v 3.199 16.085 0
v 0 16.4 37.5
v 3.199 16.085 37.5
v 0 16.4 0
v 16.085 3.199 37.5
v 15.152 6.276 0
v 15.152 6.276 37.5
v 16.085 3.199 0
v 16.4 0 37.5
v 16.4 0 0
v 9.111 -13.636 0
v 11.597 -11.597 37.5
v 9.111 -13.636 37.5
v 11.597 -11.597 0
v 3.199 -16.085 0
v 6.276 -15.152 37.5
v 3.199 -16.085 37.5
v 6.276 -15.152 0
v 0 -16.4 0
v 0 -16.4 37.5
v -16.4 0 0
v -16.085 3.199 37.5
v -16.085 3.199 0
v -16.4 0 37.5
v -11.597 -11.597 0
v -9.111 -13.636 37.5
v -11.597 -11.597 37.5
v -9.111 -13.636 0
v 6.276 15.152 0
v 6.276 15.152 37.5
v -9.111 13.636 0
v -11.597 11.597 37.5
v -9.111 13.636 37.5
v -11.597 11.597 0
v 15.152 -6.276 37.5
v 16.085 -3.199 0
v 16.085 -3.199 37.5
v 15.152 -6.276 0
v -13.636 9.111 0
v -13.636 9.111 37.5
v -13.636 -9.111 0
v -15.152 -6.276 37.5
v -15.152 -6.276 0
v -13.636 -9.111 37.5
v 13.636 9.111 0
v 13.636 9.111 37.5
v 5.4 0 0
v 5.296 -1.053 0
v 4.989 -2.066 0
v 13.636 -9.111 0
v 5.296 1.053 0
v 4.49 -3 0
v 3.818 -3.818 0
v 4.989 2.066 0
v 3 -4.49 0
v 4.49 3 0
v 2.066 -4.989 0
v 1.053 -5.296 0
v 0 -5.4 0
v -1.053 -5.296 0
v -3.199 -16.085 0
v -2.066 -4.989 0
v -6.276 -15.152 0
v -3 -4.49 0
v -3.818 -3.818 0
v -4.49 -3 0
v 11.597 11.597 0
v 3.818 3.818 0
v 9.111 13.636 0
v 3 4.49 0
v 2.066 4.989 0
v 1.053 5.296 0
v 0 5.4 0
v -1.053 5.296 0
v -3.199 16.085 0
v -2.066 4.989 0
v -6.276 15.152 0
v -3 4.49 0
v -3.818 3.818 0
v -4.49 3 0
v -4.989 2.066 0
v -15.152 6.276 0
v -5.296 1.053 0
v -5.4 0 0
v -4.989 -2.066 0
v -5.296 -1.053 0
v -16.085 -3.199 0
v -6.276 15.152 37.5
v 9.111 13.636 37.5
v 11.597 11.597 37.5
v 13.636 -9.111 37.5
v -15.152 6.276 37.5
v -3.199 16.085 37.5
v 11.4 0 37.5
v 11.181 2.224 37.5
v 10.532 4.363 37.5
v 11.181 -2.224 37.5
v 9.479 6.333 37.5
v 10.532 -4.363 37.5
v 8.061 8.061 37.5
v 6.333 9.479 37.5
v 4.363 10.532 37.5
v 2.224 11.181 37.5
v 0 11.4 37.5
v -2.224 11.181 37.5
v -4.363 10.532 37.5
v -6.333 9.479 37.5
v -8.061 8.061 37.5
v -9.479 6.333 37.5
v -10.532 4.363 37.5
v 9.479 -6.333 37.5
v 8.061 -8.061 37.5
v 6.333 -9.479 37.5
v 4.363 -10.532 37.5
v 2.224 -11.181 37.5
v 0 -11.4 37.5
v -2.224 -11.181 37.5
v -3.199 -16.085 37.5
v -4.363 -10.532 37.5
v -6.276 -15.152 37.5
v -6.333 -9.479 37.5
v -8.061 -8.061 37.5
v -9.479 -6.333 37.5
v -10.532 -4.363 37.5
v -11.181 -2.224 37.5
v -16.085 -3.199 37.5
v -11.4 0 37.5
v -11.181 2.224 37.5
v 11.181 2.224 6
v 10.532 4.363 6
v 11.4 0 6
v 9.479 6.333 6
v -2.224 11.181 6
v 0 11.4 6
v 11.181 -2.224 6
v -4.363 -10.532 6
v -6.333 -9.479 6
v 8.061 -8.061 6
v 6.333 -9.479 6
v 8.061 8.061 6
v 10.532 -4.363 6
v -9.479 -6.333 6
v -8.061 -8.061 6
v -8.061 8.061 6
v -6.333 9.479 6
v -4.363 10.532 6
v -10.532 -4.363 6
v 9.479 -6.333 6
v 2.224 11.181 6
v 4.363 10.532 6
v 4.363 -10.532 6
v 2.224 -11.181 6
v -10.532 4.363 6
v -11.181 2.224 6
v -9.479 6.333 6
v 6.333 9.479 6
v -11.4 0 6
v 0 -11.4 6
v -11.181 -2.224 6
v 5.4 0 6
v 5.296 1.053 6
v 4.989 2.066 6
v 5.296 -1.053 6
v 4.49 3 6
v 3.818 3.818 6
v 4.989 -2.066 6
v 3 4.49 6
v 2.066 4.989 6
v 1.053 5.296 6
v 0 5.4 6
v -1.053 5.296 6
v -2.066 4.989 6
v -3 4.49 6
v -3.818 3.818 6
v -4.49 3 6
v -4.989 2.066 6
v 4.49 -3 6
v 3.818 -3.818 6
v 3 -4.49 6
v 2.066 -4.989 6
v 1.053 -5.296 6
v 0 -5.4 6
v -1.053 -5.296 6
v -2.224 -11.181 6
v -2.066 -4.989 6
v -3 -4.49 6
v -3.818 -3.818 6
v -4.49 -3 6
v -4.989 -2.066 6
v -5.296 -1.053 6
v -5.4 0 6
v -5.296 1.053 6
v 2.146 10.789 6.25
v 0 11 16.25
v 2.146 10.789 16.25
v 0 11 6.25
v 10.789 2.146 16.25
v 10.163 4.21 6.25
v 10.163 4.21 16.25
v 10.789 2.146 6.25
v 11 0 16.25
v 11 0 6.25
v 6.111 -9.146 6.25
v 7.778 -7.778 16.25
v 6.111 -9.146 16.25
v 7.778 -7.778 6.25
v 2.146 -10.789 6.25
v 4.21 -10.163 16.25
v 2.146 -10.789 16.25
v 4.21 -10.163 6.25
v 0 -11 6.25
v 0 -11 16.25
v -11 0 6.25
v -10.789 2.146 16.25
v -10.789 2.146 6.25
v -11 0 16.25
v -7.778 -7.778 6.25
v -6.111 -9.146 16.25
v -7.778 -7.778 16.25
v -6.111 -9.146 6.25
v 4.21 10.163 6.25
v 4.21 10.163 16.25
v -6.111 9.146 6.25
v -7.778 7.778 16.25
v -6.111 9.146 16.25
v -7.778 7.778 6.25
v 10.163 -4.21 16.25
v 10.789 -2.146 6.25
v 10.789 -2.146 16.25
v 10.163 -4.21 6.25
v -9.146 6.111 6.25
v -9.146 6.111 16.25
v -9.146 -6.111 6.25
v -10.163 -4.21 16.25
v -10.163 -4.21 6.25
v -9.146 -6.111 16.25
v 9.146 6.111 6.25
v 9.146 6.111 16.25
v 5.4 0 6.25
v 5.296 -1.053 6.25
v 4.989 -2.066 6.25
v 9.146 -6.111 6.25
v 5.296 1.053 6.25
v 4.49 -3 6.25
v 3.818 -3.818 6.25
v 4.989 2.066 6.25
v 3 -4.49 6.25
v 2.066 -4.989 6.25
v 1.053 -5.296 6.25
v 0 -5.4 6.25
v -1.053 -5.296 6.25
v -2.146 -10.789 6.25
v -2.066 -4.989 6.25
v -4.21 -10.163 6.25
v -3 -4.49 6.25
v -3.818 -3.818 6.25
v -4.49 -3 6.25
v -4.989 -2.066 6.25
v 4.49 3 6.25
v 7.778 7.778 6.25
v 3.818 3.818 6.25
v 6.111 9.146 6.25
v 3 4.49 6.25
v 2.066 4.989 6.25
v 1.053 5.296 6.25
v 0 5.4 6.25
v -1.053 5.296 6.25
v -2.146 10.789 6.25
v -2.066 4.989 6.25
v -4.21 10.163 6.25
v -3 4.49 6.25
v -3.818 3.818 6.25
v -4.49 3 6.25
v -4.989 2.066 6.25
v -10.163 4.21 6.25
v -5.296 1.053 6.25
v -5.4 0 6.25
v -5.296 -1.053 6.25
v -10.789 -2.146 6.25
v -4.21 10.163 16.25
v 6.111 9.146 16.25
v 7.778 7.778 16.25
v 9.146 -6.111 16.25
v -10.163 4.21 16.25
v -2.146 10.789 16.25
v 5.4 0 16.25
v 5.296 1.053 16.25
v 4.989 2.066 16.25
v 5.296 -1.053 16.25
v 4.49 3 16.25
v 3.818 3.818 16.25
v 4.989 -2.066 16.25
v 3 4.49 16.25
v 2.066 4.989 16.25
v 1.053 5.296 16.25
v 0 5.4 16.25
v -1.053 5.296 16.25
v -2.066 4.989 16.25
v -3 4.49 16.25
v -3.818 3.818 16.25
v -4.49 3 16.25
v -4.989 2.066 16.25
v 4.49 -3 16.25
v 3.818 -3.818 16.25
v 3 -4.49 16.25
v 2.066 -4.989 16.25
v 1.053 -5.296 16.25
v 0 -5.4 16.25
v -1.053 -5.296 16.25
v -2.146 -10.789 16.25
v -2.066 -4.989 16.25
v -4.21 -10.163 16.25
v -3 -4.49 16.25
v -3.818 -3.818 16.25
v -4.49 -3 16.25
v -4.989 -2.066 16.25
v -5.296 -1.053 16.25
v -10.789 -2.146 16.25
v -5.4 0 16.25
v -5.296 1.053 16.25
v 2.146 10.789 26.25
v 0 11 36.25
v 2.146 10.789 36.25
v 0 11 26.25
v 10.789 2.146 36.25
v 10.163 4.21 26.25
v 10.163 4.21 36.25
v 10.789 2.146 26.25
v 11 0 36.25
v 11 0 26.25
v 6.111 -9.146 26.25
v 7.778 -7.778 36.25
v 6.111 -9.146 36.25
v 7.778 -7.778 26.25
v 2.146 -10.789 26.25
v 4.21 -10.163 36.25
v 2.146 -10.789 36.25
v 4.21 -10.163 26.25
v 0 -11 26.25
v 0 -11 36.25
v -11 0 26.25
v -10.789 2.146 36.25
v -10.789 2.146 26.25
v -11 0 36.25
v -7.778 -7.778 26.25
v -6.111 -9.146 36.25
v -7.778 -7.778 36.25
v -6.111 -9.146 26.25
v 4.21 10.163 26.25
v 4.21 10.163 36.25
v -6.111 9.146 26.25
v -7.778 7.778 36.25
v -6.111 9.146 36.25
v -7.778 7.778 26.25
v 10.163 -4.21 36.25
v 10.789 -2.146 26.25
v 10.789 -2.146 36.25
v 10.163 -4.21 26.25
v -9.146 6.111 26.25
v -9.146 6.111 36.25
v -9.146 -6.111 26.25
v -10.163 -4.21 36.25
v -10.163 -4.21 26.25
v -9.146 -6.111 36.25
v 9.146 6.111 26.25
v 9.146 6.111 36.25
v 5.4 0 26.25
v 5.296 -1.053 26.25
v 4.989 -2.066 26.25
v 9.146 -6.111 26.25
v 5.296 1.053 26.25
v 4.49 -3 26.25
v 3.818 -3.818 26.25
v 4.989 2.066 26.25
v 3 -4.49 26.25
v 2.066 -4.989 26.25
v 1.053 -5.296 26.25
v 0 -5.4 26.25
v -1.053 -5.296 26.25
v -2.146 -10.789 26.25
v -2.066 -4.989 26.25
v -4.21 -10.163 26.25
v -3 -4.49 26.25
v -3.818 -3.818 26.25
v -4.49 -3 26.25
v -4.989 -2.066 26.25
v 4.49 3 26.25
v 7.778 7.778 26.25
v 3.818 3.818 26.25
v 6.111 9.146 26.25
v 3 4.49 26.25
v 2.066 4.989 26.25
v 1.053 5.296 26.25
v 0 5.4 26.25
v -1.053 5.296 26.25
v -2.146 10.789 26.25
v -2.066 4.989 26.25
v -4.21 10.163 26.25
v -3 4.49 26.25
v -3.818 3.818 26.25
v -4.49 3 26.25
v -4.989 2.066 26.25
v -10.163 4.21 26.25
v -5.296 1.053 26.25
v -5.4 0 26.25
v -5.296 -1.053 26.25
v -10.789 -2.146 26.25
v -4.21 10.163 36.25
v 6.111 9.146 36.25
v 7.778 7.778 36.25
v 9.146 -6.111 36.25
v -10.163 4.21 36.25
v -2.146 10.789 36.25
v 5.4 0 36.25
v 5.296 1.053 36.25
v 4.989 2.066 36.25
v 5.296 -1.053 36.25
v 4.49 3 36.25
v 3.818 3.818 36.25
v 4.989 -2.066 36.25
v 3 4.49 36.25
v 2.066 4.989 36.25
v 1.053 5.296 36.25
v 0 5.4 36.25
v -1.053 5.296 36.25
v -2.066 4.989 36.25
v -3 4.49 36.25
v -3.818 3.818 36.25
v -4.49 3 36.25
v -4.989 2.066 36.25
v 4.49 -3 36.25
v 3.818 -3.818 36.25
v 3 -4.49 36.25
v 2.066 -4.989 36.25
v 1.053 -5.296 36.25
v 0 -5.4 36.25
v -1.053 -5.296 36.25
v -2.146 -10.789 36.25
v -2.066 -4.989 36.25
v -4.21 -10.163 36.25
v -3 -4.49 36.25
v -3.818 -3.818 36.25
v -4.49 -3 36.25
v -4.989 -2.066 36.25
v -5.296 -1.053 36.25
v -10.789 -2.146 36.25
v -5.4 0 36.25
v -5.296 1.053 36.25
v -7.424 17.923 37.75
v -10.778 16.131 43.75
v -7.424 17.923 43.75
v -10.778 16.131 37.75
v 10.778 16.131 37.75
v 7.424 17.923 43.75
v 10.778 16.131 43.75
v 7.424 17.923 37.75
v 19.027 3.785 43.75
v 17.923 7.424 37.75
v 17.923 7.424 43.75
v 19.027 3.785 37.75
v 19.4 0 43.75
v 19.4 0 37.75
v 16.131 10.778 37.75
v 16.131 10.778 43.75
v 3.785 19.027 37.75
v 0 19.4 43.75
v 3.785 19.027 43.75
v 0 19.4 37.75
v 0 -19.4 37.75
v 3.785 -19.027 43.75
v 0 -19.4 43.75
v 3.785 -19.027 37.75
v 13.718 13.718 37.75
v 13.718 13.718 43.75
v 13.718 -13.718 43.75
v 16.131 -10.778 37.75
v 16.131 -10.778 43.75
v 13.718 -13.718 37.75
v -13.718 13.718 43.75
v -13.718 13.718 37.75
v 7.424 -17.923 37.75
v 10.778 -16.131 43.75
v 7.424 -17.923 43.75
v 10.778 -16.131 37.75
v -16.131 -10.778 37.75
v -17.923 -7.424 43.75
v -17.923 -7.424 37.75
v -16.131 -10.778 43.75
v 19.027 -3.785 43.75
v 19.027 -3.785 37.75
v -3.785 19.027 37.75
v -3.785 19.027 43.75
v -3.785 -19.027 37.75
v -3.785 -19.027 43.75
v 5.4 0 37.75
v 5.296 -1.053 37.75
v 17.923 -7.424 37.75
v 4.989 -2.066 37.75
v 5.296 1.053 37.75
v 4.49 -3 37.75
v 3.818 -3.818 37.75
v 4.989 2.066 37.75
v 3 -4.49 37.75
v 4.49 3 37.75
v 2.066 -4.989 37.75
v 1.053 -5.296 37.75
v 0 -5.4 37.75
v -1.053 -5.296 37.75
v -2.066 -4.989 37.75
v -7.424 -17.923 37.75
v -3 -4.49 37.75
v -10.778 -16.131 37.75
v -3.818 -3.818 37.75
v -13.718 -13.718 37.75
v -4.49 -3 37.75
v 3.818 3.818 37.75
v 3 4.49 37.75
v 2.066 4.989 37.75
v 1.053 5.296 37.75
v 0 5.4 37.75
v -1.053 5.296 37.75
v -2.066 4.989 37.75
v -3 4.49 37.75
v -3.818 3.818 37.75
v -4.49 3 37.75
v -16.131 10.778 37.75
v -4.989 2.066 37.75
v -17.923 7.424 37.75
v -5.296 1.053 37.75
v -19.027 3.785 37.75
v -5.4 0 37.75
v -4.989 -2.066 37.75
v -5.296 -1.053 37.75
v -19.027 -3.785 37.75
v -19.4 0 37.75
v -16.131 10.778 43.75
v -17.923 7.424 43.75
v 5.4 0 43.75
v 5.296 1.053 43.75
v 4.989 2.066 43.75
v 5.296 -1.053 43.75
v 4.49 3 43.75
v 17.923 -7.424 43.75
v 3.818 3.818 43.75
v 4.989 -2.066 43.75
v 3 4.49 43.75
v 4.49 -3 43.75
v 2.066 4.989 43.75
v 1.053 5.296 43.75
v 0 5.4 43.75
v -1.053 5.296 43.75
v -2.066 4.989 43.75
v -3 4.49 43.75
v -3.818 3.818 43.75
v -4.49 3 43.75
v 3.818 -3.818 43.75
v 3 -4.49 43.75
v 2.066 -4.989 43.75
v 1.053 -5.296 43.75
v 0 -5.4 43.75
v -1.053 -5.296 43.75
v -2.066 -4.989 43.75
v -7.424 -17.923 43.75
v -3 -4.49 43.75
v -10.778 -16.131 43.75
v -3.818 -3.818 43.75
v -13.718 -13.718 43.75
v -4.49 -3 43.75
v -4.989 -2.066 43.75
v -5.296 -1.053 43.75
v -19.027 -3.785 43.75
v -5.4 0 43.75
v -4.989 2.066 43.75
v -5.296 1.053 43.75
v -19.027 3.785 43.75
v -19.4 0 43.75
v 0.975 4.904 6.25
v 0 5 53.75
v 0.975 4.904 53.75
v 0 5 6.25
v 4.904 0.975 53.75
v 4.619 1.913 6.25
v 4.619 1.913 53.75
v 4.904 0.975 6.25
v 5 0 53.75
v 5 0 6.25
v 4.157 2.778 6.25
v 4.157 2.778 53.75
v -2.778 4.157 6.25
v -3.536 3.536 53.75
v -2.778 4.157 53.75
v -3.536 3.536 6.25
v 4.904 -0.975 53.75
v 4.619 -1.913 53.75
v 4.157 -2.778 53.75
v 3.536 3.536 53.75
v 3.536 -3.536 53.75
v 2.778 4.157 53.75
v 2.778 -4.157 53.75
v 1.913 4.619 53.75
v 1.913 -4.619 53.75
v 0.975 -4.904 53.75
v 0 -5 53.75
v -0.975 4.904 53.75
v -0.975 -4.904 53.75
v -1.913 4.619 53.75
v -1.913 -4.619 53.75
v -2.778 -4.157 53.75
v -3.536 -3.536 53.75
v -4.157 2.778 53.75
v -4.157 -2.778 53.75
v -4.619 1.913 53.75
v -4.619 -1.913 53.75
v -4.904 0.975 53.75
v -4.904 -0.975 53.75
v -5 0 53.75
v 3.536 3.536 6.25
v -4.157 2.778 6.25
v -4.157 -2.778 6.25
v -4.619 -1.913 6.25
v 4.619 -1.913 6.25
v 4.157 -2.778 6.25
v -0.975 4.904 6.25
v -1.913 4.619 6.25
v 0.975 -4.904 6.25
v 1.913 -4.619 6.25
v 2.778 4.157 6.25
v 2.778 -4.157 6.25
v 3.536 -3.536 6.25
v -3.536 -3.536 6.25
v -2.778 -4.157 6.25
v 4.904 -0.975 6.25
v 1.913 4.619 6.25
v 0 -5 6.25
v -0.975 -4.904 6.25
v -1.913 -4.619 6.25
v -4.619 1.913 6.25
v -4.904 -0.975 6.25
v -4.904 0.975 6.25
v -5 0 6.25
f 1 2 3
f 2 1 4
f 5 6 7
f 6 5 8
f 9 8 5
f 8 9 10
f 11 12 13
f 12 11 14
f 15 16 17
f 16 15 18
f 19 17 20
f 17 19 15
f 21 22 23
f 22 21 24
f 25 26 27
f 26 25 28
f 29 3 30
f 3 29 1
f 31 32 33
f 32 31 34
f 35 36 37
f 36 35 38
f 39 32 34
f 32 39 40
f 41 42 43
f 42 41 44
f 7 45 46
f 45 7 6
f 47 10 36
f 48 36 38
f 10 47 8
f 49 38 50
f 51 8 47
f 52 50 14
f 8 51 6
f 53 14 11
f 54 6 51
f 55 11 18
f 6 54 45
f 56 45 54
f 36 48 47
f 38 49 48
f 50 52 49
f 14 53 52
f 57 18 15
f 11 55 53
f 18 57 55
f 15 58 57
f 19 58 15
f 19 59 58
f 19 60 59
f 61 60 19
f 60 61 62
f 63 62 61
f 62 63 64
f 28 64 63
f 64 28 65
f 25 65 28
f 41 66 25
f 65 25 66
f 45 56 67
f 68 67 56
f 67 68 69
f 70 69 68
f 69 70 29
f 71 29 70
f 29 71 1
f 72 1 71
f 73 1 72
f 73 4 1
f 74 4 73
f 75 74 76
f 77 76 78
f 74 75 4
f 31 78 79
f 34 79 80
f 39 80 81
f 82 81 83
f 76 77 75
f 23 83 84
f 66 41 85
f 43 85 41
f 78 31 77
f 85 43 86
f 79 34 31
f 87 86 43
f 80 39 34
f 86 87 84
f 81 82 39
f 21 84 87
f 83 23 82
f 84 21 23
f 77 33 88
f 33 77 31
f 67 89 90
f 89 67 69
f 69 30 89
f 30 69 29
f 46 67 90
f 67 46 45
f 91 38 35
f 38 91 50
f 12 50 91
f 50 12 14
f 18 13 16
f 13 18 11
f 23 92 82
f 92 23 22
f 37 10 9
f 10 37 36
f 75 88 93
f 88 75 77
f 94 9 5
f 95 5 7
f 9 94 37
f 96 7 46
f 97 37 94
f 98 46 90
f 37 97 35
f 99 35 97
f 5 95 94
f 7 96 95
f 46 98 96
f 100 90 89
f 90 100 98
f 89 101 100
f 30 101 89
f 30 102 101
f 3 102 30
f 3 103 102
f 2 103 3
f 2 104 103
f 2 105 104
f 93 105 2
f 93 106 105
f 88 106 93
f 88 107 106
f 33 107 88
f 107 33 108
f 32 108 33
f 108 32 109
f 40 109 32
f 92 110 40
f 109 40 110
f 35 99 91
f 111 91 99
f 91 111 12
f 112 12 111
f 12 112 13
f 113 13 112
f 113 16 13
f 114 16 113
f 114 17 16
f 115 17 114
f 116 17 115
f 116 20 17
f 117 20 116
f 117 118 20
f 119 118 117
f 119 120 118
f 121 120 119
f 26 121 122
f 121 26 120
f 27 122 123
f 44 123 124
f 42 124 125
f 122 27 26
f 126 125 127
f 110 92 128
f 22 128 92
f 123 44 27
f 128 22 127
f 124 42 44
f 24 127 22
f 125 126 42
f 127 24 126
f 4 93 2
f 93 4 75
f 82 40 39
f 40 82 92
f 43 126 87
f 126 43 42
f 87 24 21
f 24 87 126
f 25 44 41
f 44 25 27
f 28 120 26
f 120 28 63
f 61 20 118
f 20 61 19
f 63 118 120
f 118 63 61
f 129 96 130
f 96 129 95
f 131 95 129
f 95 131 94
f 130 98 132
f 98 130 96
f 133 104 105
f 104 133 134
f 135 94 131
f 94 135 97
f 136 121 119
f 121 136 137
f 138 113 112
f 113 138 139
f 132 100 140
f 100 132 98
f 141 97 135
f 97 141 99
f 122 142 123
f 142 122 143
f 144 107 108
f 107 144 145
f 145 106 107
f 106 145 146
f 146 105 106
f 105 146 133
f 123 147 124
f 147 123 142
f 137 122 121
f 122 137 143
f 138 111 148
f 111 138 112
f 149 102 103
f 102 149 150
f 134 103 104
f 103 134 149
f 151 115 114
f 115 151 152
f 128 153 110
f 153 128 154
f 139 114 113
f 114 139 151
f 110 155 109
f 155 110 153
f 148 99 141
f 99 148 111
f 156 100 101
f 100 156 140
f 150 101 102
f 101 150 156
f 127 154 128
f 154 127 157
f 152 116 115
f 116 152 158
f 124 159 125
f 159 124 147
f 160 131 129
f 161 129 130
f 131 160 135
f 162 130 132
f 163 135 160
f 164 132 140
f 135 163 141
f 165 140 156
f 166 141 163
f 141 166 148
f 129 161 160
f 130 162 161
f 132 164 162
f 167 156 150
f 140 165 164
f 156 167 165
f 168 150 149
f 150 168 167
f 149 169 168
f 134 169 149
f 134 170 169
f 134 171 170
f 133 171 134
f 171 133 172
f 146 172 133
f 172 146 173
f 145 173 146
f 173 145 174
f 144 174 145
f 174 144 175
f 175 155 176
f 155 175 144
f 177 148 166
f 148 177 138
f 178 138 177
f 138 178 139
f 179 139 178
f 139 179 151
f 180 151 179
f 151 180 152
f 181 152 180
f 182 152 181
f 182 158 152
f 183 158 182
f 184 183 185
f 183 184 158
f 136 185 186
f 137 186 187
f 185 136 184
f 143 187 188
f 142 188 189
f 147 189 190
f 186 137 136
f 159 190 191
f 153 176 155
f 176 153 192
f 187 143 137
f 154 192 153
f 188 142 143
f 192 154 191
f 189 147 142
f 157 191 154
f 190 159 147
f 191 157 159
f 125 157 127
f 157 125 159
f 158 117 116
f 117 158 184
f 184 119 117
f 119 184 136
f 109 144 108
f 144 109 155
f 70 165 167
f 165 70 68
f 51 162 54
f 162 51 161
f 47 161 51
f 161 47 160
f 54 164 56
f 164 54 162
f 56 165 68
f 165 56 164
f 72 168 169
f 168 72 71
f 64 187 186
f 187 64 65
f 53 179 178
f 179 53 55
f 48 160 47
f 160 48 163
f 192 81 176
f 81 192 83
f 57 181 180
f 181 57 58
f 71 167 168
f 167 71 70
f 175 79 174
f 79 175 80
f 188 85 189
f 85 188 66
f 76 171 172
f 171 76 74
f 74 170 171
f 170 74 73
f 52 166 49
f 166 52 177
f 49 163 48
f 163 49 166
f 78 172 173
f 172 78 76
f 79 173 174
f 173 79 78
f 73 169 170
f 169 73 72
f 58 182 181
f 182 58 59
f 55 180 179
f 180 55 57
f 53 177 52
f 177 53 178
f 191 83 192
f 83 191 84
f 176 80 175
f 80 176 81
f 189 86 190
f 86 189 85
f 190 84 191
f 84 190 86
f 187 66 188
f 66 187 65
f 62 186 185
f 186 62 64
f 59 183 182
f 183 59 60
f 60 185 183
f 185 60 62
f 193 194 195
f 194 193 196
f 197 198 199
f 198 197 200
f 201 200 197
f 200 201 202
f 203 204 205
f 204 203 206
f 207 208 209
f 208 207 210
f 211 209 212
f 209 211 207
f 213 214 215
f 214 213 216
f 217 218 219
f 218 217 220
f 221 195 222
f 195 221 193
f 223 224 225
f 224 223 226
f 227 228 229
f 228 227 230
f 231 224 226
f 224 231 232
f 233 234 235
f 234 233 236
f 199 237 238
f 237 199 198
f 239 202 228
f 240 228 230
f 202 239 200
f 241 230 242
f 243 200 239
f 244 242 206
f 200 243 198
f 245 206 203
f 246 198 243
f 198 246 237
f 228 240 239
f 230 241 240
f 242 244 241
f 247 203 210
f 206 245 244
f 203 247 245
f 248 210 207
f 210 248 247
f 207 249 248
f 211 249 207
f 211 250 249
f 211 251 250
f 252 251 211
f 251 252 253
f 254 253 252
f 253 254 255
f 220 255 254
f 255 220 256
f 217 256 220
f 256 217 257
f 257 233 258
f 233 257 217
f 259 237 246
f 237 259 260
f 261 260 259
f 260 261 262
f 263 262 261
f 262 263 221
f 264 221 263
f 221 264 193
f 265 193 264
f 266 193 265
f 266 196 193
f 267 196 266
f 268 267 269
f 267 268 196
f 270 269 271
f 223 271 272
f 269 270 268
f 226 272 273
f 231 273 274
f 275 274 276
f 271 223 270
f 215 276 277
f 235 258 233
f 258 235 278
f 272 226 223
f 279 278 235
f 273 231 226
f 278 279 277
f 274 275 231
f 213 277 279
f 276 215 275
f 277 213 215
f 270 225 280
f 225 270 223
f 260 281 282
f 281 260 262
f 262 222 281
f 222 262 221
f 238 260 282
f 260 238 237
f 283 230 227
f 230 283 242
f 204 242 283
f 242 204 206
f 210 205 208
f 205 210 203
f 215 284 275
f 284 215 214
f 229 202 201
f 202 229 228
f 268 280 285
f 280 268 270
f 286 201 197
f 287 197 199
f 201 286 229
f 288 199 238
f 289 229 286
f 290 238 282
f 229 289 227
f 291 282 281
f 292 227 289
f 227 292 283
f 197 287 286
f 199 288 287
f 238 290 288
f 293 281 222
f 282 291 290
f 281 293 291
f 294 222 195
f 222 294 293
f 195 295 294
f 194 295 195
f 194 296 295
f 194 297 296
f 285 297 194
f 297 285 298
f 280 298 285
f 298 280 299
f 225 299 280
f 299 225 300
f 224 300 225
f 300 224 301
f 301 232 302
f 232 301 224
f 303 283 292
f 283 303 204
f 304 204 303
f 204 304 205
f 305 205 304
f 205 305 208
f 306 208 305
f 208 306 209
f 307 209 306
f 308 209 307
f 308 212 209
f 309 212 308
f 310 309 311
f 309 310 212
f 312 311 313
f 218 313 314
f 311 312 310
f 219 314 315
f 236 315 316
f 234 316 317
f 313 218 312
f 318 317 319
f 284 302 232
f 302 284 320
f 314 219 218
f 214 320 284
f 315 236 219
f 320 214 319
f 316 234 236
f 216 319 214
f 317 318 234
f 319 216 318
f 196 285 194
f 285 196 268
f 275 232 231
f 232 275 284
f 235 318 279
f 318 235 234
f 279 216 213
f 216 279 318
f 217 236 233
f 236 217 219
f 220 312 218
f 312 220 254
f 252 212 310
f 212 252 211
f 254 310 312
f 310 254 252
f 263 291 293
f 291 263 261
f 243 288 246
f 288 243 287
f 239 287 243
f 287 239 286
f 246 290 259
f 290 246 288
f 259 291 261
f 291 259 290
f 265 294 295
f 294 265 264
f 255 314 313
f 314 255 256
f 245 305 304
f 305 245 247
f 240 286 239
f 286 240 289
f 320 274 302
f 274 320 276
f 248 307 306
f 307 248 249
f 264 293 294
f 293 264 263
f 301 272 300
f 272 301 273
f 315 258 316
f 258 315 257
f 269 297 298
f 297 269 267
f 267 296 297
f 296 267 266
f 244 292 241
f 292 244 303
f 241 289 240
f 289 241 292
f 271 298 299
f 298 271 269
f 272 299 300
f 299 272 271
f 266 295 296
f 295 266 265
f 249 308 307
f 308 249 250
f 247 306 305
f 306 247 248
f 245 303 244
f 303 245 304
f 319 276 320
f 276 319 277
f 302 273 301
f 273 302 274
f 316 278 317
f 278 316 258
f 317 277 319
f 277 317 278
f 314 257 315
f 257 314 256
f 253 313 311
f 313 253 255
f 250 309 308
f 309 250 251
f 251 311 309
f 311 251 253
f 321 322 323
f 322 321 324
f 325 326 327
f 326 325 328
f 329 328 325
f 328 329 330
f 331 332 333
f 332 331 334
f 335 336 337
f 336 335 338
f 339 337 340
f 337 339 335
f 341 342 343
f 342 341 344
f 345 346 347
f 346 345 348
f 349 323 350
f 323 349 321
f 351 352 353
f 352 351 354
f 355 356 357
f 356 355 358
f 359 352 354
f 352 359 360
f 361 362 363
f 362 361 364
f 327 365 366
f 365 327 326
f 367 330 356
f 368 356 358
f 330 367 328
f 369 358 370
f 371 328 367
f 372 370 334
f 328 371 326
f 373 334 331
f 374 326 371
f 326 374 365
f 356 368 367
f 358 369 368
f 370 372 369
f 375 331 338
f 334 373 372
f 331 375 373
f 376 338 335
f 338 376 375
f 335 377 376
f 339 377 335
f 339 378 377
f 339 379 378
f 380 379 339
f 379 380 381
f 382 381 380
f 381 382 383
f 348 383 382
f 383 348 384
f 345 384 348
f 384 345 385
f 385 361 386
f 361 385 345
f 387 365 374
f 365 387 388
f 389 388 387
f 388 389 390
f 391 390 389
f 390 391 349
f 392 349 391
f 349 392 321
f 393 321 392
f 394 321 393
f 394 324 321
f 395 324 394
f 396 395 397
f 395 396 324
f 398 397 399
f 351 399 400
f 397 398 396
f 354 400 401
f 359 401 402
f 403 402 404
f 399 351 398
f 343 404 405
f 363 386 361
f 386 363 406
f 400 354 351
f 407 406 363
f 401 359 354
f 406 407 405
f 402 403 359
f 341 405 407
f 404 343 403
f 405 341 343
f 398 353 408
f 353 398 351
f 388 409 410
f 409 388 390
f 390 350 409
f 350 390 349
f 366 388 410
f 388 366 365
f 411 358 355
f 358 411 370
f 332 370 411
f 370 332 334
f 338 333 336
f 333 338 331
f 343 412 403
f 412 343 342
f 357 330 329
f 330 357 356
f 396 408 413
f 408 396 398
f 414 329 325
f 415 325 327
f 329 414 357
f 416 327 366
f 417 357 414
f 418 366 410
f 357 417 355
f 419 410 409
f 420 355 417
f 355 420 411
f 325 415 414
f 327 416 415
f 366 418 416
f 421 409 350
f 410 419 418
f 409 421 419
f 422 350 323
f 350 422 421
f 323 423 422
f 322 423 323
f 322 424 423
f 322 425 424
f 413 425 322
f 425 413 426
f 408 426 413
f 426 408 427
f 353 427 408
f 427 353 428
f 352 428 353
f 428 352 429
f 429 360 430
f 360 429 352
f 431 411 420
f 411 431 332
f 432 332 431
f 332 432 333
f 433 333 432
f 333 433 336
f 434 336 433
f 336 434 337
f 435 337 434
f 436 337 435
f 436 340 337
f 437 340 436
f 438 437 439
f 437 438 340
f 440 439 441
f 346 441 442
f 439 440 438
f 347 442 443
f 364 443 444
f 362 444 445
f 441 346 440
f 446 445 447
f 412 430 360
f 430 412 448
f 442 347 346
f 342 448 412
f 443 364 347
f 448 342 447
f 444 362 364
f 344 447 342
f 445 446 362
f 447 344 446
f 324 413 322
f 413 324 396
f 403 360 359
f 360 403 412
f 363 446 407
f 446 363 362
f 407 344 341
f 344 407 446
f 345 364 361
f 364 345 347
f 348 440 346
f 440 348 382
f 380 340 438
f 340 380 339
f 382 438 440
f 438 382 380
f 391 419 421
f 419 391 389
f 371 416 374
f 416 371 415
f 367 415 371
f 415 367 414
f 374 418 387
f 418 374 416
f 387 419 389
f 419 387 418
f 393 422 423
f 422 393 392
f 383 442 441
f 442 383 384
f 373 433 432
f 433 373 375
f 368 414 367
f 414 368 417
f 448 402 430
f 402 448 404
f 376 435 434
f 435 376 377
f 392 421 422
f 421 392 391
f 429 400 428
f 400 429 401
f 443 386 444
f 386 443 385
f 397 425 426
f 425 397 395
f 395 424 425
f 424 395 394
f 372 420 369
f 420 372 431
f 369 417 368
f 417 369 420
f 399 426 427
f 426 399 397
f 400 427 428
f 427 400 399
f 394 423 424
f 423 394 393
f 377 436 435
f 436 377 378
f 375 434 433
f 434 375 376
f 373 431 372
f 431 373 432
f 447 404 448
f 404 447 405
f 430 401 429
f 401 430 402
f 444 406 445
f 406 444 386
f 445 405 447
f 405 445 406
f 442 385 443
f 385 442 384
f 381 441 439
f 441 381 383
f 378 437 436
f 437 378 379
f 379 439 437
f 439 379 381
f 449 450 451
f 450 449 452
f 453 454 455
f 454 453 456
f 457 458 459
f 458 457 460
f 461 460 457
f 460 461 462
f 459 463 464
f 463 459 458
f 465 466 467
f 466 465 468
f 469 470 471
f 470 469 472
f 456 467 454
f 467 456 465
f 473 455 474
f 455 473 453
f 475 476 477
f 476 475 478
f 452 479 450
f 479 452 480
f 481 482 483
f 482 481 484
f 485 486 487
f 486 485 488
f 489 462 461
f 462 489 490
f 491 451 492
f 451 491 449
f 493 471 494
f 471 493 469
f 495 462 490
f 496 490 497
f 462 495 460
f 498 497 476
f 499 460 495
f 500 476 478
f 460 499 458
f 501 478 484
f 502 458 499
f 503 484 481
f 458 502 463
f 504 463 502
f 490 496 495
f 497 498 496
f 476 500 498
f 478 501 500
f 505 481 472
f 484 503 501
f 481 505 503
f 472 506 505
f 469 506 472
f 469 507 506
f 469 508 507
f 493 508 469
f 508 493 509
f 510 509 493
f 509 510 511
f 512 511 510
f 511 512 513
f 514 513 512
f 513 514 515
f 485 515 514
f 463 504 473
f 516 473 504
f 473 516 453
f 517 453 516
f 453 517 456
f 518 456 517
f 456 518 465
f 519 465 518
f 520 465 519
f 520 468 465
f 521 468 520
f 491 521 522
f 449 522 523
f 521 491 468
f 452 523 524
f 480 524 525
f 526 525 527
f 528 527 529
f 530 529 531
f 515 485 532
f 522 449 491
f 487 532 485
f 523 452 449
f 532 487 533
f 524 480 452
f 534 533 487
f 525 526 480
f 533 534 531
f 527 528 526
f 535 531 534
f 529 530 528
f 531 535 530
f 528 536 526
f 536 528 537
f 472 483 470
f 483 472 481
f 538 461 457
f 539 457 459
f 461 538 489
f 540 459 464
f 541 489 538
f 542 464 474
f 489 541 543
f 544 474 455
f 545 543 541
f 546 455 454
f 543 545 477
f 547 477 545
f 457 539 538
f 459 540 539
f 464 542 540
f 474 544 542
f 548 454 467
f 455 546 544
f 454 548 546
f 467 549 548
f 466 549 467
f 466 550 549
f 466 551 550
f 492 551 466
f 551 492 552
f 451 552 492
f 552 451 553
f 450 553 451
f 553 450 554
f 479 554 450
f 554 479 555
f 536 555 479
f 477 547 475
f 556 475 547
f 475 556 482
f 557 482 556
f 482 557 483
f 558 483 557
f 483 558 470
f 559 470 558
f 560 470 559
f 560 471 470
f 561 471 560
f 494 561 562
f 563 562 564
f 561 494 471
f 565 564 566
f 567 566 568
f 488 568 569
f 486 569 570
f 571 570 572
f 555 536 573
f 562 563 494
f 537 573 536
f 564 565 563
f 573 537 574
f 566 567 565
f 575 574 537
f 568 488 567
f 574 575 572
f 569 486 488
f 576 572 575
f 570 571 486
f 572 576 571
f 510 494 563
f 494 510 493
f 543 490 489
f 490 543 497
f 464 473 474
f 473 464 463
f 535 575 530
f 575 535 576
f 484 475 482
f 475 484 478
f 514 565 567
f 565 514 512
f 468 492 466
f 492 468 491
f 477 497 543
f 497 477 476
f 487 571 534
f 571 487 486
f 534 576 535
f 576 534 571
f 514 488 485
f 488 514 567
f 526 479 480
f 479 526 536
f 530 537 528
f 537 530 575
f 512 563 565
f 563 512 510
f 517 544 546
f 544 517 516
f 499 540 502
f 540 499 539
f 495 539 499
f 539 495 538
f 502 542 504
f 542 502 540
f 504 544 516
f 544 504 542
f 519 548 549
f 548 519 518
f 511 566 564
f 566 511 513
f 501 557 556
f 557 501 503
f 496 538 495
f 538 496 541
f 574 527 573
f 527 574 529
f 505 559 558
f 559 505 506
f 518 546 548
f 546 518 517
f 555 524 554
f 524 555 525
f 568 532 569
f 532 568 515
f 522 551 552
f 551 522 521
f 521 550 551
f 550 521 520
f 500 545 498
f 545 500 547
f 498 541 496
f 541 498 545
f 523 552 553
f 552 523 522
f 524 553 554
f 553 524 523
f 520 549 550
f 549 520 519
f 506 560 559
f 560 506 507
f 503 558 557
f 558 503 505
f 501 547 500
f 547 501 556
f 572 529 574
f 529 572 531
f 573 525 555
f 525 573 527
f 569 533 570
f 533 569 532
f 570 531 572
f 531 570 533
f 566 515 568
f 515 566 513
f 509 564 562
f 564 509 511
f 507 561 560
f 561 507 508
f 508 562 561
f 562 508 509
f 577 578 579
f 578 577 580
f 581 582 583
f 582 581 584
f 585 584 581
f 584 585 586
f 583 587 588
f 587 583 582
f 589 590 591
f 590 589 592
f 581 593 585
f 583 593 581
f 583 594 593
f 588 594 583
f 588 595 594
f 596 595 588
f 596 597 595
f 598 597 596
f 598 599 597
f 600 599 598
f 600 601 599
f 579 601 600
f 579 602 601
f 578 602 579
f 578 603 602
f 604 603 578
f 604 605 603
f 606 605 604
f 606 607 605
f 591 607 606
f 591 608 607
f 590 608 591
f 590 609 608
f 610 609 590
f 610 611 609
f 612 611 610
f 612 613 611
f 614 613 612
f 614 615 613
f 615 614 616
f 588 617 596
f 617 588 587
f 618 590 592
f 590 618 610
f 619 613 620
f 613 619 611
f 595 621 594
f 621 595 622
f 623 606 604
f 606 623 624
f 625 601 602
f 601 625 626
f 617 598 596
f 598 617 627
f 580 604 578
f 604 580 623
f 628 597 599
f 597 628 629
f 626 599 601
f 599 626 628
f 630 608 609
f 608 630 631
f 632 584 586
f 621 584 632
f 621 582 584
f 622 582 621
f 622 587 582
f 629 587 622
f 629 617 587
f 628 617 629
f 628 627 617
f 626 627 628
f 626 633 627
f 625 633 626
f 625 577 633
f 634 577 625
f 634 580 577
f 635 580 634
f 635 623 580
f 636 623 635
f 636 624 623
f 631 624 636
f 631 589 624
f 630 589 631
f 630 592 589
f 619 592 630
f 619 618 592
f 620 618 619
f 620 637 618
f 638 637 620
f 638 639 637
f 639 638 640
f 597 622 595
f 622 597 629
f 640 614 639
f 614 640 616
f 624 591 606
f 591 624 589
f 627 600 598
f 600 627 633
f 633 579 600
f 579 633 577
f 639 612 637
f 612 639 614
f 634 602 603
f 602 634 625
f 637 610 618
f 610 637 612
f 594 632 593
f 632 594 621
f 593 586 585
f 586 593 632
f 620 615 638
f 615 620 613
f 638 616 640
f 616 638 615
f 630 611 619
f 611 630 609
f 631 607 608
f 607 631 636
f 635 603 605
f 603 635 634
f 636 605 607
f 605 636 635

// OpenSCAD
$fn = 32;

// ------------------------------------------------------------------------
// Shaft station: cup d32.8 x 37.5 mm, shaft d10
// Every part is its own module, assembly() places every instance.
// ------------------------------------------------------------------------

// --- part 1 ---
module housing_cup() {
  difference() {
    cylinder(h = 37.5, d = 32.8);
    translate([0, 0, 6]) cylinder(h = 32.5, d = 22.8);
    translate([0, 0, -1]) cylinder(h = 8, d = 10.8);
  }
}

// --- part 2 ---
module bearing_lower() {
  difference() {
      translate([0, 0, 0]) cylinder(h = 10, d = 22);
      translate([0, 0, -1]) cylinder(h = 12, d = 10.8);
    }
}

// --- part 3 ---
module bearing_upper() {
  difference() {
      translate([0, 0, 0]) cylinder(h = 10, d = 22);
      translate([0, 0, -1]) cylinder(h = 12, d = 10.8);
    }
}

// --- part 4 ---
module station_shaft() {
  translate([0, 0, -23.75]) cylinder(h = 47.5, d = 10);
}

// --- part 5 ---
module station_cover() {
  difference() {
    cylinder(h = 6, d = 38.8);
    translate([0, 0, -1]) cylinder(h = 8, d = 10.8);
  }
}

// --- assembly ---
module assembly() {
  color([0.80, 0.24, 0.20]) translate([0, 0, 0]) rotate([0, 0, 0]) housing_cup();
  color([0.20, 0.45, 0.75]) translate([0, 0, 6.25]) rotate([0, 0, 0]) bearing_lower();
  color([0.25, 0.62, 0.32]) translate([0, 0, 26.25]) rotate([0, 0, 0]) bearing_upper();
  color([0.92, 0.70, 0.18]) translate([0, 0, 30]) rotate([0, 0, 0]) station_shaft();
  color([0.58, 0.35, 0.70]) translate([0, 0, 37.75]) rotate([0, 0, 0]) station_cover();
}

assembly();
